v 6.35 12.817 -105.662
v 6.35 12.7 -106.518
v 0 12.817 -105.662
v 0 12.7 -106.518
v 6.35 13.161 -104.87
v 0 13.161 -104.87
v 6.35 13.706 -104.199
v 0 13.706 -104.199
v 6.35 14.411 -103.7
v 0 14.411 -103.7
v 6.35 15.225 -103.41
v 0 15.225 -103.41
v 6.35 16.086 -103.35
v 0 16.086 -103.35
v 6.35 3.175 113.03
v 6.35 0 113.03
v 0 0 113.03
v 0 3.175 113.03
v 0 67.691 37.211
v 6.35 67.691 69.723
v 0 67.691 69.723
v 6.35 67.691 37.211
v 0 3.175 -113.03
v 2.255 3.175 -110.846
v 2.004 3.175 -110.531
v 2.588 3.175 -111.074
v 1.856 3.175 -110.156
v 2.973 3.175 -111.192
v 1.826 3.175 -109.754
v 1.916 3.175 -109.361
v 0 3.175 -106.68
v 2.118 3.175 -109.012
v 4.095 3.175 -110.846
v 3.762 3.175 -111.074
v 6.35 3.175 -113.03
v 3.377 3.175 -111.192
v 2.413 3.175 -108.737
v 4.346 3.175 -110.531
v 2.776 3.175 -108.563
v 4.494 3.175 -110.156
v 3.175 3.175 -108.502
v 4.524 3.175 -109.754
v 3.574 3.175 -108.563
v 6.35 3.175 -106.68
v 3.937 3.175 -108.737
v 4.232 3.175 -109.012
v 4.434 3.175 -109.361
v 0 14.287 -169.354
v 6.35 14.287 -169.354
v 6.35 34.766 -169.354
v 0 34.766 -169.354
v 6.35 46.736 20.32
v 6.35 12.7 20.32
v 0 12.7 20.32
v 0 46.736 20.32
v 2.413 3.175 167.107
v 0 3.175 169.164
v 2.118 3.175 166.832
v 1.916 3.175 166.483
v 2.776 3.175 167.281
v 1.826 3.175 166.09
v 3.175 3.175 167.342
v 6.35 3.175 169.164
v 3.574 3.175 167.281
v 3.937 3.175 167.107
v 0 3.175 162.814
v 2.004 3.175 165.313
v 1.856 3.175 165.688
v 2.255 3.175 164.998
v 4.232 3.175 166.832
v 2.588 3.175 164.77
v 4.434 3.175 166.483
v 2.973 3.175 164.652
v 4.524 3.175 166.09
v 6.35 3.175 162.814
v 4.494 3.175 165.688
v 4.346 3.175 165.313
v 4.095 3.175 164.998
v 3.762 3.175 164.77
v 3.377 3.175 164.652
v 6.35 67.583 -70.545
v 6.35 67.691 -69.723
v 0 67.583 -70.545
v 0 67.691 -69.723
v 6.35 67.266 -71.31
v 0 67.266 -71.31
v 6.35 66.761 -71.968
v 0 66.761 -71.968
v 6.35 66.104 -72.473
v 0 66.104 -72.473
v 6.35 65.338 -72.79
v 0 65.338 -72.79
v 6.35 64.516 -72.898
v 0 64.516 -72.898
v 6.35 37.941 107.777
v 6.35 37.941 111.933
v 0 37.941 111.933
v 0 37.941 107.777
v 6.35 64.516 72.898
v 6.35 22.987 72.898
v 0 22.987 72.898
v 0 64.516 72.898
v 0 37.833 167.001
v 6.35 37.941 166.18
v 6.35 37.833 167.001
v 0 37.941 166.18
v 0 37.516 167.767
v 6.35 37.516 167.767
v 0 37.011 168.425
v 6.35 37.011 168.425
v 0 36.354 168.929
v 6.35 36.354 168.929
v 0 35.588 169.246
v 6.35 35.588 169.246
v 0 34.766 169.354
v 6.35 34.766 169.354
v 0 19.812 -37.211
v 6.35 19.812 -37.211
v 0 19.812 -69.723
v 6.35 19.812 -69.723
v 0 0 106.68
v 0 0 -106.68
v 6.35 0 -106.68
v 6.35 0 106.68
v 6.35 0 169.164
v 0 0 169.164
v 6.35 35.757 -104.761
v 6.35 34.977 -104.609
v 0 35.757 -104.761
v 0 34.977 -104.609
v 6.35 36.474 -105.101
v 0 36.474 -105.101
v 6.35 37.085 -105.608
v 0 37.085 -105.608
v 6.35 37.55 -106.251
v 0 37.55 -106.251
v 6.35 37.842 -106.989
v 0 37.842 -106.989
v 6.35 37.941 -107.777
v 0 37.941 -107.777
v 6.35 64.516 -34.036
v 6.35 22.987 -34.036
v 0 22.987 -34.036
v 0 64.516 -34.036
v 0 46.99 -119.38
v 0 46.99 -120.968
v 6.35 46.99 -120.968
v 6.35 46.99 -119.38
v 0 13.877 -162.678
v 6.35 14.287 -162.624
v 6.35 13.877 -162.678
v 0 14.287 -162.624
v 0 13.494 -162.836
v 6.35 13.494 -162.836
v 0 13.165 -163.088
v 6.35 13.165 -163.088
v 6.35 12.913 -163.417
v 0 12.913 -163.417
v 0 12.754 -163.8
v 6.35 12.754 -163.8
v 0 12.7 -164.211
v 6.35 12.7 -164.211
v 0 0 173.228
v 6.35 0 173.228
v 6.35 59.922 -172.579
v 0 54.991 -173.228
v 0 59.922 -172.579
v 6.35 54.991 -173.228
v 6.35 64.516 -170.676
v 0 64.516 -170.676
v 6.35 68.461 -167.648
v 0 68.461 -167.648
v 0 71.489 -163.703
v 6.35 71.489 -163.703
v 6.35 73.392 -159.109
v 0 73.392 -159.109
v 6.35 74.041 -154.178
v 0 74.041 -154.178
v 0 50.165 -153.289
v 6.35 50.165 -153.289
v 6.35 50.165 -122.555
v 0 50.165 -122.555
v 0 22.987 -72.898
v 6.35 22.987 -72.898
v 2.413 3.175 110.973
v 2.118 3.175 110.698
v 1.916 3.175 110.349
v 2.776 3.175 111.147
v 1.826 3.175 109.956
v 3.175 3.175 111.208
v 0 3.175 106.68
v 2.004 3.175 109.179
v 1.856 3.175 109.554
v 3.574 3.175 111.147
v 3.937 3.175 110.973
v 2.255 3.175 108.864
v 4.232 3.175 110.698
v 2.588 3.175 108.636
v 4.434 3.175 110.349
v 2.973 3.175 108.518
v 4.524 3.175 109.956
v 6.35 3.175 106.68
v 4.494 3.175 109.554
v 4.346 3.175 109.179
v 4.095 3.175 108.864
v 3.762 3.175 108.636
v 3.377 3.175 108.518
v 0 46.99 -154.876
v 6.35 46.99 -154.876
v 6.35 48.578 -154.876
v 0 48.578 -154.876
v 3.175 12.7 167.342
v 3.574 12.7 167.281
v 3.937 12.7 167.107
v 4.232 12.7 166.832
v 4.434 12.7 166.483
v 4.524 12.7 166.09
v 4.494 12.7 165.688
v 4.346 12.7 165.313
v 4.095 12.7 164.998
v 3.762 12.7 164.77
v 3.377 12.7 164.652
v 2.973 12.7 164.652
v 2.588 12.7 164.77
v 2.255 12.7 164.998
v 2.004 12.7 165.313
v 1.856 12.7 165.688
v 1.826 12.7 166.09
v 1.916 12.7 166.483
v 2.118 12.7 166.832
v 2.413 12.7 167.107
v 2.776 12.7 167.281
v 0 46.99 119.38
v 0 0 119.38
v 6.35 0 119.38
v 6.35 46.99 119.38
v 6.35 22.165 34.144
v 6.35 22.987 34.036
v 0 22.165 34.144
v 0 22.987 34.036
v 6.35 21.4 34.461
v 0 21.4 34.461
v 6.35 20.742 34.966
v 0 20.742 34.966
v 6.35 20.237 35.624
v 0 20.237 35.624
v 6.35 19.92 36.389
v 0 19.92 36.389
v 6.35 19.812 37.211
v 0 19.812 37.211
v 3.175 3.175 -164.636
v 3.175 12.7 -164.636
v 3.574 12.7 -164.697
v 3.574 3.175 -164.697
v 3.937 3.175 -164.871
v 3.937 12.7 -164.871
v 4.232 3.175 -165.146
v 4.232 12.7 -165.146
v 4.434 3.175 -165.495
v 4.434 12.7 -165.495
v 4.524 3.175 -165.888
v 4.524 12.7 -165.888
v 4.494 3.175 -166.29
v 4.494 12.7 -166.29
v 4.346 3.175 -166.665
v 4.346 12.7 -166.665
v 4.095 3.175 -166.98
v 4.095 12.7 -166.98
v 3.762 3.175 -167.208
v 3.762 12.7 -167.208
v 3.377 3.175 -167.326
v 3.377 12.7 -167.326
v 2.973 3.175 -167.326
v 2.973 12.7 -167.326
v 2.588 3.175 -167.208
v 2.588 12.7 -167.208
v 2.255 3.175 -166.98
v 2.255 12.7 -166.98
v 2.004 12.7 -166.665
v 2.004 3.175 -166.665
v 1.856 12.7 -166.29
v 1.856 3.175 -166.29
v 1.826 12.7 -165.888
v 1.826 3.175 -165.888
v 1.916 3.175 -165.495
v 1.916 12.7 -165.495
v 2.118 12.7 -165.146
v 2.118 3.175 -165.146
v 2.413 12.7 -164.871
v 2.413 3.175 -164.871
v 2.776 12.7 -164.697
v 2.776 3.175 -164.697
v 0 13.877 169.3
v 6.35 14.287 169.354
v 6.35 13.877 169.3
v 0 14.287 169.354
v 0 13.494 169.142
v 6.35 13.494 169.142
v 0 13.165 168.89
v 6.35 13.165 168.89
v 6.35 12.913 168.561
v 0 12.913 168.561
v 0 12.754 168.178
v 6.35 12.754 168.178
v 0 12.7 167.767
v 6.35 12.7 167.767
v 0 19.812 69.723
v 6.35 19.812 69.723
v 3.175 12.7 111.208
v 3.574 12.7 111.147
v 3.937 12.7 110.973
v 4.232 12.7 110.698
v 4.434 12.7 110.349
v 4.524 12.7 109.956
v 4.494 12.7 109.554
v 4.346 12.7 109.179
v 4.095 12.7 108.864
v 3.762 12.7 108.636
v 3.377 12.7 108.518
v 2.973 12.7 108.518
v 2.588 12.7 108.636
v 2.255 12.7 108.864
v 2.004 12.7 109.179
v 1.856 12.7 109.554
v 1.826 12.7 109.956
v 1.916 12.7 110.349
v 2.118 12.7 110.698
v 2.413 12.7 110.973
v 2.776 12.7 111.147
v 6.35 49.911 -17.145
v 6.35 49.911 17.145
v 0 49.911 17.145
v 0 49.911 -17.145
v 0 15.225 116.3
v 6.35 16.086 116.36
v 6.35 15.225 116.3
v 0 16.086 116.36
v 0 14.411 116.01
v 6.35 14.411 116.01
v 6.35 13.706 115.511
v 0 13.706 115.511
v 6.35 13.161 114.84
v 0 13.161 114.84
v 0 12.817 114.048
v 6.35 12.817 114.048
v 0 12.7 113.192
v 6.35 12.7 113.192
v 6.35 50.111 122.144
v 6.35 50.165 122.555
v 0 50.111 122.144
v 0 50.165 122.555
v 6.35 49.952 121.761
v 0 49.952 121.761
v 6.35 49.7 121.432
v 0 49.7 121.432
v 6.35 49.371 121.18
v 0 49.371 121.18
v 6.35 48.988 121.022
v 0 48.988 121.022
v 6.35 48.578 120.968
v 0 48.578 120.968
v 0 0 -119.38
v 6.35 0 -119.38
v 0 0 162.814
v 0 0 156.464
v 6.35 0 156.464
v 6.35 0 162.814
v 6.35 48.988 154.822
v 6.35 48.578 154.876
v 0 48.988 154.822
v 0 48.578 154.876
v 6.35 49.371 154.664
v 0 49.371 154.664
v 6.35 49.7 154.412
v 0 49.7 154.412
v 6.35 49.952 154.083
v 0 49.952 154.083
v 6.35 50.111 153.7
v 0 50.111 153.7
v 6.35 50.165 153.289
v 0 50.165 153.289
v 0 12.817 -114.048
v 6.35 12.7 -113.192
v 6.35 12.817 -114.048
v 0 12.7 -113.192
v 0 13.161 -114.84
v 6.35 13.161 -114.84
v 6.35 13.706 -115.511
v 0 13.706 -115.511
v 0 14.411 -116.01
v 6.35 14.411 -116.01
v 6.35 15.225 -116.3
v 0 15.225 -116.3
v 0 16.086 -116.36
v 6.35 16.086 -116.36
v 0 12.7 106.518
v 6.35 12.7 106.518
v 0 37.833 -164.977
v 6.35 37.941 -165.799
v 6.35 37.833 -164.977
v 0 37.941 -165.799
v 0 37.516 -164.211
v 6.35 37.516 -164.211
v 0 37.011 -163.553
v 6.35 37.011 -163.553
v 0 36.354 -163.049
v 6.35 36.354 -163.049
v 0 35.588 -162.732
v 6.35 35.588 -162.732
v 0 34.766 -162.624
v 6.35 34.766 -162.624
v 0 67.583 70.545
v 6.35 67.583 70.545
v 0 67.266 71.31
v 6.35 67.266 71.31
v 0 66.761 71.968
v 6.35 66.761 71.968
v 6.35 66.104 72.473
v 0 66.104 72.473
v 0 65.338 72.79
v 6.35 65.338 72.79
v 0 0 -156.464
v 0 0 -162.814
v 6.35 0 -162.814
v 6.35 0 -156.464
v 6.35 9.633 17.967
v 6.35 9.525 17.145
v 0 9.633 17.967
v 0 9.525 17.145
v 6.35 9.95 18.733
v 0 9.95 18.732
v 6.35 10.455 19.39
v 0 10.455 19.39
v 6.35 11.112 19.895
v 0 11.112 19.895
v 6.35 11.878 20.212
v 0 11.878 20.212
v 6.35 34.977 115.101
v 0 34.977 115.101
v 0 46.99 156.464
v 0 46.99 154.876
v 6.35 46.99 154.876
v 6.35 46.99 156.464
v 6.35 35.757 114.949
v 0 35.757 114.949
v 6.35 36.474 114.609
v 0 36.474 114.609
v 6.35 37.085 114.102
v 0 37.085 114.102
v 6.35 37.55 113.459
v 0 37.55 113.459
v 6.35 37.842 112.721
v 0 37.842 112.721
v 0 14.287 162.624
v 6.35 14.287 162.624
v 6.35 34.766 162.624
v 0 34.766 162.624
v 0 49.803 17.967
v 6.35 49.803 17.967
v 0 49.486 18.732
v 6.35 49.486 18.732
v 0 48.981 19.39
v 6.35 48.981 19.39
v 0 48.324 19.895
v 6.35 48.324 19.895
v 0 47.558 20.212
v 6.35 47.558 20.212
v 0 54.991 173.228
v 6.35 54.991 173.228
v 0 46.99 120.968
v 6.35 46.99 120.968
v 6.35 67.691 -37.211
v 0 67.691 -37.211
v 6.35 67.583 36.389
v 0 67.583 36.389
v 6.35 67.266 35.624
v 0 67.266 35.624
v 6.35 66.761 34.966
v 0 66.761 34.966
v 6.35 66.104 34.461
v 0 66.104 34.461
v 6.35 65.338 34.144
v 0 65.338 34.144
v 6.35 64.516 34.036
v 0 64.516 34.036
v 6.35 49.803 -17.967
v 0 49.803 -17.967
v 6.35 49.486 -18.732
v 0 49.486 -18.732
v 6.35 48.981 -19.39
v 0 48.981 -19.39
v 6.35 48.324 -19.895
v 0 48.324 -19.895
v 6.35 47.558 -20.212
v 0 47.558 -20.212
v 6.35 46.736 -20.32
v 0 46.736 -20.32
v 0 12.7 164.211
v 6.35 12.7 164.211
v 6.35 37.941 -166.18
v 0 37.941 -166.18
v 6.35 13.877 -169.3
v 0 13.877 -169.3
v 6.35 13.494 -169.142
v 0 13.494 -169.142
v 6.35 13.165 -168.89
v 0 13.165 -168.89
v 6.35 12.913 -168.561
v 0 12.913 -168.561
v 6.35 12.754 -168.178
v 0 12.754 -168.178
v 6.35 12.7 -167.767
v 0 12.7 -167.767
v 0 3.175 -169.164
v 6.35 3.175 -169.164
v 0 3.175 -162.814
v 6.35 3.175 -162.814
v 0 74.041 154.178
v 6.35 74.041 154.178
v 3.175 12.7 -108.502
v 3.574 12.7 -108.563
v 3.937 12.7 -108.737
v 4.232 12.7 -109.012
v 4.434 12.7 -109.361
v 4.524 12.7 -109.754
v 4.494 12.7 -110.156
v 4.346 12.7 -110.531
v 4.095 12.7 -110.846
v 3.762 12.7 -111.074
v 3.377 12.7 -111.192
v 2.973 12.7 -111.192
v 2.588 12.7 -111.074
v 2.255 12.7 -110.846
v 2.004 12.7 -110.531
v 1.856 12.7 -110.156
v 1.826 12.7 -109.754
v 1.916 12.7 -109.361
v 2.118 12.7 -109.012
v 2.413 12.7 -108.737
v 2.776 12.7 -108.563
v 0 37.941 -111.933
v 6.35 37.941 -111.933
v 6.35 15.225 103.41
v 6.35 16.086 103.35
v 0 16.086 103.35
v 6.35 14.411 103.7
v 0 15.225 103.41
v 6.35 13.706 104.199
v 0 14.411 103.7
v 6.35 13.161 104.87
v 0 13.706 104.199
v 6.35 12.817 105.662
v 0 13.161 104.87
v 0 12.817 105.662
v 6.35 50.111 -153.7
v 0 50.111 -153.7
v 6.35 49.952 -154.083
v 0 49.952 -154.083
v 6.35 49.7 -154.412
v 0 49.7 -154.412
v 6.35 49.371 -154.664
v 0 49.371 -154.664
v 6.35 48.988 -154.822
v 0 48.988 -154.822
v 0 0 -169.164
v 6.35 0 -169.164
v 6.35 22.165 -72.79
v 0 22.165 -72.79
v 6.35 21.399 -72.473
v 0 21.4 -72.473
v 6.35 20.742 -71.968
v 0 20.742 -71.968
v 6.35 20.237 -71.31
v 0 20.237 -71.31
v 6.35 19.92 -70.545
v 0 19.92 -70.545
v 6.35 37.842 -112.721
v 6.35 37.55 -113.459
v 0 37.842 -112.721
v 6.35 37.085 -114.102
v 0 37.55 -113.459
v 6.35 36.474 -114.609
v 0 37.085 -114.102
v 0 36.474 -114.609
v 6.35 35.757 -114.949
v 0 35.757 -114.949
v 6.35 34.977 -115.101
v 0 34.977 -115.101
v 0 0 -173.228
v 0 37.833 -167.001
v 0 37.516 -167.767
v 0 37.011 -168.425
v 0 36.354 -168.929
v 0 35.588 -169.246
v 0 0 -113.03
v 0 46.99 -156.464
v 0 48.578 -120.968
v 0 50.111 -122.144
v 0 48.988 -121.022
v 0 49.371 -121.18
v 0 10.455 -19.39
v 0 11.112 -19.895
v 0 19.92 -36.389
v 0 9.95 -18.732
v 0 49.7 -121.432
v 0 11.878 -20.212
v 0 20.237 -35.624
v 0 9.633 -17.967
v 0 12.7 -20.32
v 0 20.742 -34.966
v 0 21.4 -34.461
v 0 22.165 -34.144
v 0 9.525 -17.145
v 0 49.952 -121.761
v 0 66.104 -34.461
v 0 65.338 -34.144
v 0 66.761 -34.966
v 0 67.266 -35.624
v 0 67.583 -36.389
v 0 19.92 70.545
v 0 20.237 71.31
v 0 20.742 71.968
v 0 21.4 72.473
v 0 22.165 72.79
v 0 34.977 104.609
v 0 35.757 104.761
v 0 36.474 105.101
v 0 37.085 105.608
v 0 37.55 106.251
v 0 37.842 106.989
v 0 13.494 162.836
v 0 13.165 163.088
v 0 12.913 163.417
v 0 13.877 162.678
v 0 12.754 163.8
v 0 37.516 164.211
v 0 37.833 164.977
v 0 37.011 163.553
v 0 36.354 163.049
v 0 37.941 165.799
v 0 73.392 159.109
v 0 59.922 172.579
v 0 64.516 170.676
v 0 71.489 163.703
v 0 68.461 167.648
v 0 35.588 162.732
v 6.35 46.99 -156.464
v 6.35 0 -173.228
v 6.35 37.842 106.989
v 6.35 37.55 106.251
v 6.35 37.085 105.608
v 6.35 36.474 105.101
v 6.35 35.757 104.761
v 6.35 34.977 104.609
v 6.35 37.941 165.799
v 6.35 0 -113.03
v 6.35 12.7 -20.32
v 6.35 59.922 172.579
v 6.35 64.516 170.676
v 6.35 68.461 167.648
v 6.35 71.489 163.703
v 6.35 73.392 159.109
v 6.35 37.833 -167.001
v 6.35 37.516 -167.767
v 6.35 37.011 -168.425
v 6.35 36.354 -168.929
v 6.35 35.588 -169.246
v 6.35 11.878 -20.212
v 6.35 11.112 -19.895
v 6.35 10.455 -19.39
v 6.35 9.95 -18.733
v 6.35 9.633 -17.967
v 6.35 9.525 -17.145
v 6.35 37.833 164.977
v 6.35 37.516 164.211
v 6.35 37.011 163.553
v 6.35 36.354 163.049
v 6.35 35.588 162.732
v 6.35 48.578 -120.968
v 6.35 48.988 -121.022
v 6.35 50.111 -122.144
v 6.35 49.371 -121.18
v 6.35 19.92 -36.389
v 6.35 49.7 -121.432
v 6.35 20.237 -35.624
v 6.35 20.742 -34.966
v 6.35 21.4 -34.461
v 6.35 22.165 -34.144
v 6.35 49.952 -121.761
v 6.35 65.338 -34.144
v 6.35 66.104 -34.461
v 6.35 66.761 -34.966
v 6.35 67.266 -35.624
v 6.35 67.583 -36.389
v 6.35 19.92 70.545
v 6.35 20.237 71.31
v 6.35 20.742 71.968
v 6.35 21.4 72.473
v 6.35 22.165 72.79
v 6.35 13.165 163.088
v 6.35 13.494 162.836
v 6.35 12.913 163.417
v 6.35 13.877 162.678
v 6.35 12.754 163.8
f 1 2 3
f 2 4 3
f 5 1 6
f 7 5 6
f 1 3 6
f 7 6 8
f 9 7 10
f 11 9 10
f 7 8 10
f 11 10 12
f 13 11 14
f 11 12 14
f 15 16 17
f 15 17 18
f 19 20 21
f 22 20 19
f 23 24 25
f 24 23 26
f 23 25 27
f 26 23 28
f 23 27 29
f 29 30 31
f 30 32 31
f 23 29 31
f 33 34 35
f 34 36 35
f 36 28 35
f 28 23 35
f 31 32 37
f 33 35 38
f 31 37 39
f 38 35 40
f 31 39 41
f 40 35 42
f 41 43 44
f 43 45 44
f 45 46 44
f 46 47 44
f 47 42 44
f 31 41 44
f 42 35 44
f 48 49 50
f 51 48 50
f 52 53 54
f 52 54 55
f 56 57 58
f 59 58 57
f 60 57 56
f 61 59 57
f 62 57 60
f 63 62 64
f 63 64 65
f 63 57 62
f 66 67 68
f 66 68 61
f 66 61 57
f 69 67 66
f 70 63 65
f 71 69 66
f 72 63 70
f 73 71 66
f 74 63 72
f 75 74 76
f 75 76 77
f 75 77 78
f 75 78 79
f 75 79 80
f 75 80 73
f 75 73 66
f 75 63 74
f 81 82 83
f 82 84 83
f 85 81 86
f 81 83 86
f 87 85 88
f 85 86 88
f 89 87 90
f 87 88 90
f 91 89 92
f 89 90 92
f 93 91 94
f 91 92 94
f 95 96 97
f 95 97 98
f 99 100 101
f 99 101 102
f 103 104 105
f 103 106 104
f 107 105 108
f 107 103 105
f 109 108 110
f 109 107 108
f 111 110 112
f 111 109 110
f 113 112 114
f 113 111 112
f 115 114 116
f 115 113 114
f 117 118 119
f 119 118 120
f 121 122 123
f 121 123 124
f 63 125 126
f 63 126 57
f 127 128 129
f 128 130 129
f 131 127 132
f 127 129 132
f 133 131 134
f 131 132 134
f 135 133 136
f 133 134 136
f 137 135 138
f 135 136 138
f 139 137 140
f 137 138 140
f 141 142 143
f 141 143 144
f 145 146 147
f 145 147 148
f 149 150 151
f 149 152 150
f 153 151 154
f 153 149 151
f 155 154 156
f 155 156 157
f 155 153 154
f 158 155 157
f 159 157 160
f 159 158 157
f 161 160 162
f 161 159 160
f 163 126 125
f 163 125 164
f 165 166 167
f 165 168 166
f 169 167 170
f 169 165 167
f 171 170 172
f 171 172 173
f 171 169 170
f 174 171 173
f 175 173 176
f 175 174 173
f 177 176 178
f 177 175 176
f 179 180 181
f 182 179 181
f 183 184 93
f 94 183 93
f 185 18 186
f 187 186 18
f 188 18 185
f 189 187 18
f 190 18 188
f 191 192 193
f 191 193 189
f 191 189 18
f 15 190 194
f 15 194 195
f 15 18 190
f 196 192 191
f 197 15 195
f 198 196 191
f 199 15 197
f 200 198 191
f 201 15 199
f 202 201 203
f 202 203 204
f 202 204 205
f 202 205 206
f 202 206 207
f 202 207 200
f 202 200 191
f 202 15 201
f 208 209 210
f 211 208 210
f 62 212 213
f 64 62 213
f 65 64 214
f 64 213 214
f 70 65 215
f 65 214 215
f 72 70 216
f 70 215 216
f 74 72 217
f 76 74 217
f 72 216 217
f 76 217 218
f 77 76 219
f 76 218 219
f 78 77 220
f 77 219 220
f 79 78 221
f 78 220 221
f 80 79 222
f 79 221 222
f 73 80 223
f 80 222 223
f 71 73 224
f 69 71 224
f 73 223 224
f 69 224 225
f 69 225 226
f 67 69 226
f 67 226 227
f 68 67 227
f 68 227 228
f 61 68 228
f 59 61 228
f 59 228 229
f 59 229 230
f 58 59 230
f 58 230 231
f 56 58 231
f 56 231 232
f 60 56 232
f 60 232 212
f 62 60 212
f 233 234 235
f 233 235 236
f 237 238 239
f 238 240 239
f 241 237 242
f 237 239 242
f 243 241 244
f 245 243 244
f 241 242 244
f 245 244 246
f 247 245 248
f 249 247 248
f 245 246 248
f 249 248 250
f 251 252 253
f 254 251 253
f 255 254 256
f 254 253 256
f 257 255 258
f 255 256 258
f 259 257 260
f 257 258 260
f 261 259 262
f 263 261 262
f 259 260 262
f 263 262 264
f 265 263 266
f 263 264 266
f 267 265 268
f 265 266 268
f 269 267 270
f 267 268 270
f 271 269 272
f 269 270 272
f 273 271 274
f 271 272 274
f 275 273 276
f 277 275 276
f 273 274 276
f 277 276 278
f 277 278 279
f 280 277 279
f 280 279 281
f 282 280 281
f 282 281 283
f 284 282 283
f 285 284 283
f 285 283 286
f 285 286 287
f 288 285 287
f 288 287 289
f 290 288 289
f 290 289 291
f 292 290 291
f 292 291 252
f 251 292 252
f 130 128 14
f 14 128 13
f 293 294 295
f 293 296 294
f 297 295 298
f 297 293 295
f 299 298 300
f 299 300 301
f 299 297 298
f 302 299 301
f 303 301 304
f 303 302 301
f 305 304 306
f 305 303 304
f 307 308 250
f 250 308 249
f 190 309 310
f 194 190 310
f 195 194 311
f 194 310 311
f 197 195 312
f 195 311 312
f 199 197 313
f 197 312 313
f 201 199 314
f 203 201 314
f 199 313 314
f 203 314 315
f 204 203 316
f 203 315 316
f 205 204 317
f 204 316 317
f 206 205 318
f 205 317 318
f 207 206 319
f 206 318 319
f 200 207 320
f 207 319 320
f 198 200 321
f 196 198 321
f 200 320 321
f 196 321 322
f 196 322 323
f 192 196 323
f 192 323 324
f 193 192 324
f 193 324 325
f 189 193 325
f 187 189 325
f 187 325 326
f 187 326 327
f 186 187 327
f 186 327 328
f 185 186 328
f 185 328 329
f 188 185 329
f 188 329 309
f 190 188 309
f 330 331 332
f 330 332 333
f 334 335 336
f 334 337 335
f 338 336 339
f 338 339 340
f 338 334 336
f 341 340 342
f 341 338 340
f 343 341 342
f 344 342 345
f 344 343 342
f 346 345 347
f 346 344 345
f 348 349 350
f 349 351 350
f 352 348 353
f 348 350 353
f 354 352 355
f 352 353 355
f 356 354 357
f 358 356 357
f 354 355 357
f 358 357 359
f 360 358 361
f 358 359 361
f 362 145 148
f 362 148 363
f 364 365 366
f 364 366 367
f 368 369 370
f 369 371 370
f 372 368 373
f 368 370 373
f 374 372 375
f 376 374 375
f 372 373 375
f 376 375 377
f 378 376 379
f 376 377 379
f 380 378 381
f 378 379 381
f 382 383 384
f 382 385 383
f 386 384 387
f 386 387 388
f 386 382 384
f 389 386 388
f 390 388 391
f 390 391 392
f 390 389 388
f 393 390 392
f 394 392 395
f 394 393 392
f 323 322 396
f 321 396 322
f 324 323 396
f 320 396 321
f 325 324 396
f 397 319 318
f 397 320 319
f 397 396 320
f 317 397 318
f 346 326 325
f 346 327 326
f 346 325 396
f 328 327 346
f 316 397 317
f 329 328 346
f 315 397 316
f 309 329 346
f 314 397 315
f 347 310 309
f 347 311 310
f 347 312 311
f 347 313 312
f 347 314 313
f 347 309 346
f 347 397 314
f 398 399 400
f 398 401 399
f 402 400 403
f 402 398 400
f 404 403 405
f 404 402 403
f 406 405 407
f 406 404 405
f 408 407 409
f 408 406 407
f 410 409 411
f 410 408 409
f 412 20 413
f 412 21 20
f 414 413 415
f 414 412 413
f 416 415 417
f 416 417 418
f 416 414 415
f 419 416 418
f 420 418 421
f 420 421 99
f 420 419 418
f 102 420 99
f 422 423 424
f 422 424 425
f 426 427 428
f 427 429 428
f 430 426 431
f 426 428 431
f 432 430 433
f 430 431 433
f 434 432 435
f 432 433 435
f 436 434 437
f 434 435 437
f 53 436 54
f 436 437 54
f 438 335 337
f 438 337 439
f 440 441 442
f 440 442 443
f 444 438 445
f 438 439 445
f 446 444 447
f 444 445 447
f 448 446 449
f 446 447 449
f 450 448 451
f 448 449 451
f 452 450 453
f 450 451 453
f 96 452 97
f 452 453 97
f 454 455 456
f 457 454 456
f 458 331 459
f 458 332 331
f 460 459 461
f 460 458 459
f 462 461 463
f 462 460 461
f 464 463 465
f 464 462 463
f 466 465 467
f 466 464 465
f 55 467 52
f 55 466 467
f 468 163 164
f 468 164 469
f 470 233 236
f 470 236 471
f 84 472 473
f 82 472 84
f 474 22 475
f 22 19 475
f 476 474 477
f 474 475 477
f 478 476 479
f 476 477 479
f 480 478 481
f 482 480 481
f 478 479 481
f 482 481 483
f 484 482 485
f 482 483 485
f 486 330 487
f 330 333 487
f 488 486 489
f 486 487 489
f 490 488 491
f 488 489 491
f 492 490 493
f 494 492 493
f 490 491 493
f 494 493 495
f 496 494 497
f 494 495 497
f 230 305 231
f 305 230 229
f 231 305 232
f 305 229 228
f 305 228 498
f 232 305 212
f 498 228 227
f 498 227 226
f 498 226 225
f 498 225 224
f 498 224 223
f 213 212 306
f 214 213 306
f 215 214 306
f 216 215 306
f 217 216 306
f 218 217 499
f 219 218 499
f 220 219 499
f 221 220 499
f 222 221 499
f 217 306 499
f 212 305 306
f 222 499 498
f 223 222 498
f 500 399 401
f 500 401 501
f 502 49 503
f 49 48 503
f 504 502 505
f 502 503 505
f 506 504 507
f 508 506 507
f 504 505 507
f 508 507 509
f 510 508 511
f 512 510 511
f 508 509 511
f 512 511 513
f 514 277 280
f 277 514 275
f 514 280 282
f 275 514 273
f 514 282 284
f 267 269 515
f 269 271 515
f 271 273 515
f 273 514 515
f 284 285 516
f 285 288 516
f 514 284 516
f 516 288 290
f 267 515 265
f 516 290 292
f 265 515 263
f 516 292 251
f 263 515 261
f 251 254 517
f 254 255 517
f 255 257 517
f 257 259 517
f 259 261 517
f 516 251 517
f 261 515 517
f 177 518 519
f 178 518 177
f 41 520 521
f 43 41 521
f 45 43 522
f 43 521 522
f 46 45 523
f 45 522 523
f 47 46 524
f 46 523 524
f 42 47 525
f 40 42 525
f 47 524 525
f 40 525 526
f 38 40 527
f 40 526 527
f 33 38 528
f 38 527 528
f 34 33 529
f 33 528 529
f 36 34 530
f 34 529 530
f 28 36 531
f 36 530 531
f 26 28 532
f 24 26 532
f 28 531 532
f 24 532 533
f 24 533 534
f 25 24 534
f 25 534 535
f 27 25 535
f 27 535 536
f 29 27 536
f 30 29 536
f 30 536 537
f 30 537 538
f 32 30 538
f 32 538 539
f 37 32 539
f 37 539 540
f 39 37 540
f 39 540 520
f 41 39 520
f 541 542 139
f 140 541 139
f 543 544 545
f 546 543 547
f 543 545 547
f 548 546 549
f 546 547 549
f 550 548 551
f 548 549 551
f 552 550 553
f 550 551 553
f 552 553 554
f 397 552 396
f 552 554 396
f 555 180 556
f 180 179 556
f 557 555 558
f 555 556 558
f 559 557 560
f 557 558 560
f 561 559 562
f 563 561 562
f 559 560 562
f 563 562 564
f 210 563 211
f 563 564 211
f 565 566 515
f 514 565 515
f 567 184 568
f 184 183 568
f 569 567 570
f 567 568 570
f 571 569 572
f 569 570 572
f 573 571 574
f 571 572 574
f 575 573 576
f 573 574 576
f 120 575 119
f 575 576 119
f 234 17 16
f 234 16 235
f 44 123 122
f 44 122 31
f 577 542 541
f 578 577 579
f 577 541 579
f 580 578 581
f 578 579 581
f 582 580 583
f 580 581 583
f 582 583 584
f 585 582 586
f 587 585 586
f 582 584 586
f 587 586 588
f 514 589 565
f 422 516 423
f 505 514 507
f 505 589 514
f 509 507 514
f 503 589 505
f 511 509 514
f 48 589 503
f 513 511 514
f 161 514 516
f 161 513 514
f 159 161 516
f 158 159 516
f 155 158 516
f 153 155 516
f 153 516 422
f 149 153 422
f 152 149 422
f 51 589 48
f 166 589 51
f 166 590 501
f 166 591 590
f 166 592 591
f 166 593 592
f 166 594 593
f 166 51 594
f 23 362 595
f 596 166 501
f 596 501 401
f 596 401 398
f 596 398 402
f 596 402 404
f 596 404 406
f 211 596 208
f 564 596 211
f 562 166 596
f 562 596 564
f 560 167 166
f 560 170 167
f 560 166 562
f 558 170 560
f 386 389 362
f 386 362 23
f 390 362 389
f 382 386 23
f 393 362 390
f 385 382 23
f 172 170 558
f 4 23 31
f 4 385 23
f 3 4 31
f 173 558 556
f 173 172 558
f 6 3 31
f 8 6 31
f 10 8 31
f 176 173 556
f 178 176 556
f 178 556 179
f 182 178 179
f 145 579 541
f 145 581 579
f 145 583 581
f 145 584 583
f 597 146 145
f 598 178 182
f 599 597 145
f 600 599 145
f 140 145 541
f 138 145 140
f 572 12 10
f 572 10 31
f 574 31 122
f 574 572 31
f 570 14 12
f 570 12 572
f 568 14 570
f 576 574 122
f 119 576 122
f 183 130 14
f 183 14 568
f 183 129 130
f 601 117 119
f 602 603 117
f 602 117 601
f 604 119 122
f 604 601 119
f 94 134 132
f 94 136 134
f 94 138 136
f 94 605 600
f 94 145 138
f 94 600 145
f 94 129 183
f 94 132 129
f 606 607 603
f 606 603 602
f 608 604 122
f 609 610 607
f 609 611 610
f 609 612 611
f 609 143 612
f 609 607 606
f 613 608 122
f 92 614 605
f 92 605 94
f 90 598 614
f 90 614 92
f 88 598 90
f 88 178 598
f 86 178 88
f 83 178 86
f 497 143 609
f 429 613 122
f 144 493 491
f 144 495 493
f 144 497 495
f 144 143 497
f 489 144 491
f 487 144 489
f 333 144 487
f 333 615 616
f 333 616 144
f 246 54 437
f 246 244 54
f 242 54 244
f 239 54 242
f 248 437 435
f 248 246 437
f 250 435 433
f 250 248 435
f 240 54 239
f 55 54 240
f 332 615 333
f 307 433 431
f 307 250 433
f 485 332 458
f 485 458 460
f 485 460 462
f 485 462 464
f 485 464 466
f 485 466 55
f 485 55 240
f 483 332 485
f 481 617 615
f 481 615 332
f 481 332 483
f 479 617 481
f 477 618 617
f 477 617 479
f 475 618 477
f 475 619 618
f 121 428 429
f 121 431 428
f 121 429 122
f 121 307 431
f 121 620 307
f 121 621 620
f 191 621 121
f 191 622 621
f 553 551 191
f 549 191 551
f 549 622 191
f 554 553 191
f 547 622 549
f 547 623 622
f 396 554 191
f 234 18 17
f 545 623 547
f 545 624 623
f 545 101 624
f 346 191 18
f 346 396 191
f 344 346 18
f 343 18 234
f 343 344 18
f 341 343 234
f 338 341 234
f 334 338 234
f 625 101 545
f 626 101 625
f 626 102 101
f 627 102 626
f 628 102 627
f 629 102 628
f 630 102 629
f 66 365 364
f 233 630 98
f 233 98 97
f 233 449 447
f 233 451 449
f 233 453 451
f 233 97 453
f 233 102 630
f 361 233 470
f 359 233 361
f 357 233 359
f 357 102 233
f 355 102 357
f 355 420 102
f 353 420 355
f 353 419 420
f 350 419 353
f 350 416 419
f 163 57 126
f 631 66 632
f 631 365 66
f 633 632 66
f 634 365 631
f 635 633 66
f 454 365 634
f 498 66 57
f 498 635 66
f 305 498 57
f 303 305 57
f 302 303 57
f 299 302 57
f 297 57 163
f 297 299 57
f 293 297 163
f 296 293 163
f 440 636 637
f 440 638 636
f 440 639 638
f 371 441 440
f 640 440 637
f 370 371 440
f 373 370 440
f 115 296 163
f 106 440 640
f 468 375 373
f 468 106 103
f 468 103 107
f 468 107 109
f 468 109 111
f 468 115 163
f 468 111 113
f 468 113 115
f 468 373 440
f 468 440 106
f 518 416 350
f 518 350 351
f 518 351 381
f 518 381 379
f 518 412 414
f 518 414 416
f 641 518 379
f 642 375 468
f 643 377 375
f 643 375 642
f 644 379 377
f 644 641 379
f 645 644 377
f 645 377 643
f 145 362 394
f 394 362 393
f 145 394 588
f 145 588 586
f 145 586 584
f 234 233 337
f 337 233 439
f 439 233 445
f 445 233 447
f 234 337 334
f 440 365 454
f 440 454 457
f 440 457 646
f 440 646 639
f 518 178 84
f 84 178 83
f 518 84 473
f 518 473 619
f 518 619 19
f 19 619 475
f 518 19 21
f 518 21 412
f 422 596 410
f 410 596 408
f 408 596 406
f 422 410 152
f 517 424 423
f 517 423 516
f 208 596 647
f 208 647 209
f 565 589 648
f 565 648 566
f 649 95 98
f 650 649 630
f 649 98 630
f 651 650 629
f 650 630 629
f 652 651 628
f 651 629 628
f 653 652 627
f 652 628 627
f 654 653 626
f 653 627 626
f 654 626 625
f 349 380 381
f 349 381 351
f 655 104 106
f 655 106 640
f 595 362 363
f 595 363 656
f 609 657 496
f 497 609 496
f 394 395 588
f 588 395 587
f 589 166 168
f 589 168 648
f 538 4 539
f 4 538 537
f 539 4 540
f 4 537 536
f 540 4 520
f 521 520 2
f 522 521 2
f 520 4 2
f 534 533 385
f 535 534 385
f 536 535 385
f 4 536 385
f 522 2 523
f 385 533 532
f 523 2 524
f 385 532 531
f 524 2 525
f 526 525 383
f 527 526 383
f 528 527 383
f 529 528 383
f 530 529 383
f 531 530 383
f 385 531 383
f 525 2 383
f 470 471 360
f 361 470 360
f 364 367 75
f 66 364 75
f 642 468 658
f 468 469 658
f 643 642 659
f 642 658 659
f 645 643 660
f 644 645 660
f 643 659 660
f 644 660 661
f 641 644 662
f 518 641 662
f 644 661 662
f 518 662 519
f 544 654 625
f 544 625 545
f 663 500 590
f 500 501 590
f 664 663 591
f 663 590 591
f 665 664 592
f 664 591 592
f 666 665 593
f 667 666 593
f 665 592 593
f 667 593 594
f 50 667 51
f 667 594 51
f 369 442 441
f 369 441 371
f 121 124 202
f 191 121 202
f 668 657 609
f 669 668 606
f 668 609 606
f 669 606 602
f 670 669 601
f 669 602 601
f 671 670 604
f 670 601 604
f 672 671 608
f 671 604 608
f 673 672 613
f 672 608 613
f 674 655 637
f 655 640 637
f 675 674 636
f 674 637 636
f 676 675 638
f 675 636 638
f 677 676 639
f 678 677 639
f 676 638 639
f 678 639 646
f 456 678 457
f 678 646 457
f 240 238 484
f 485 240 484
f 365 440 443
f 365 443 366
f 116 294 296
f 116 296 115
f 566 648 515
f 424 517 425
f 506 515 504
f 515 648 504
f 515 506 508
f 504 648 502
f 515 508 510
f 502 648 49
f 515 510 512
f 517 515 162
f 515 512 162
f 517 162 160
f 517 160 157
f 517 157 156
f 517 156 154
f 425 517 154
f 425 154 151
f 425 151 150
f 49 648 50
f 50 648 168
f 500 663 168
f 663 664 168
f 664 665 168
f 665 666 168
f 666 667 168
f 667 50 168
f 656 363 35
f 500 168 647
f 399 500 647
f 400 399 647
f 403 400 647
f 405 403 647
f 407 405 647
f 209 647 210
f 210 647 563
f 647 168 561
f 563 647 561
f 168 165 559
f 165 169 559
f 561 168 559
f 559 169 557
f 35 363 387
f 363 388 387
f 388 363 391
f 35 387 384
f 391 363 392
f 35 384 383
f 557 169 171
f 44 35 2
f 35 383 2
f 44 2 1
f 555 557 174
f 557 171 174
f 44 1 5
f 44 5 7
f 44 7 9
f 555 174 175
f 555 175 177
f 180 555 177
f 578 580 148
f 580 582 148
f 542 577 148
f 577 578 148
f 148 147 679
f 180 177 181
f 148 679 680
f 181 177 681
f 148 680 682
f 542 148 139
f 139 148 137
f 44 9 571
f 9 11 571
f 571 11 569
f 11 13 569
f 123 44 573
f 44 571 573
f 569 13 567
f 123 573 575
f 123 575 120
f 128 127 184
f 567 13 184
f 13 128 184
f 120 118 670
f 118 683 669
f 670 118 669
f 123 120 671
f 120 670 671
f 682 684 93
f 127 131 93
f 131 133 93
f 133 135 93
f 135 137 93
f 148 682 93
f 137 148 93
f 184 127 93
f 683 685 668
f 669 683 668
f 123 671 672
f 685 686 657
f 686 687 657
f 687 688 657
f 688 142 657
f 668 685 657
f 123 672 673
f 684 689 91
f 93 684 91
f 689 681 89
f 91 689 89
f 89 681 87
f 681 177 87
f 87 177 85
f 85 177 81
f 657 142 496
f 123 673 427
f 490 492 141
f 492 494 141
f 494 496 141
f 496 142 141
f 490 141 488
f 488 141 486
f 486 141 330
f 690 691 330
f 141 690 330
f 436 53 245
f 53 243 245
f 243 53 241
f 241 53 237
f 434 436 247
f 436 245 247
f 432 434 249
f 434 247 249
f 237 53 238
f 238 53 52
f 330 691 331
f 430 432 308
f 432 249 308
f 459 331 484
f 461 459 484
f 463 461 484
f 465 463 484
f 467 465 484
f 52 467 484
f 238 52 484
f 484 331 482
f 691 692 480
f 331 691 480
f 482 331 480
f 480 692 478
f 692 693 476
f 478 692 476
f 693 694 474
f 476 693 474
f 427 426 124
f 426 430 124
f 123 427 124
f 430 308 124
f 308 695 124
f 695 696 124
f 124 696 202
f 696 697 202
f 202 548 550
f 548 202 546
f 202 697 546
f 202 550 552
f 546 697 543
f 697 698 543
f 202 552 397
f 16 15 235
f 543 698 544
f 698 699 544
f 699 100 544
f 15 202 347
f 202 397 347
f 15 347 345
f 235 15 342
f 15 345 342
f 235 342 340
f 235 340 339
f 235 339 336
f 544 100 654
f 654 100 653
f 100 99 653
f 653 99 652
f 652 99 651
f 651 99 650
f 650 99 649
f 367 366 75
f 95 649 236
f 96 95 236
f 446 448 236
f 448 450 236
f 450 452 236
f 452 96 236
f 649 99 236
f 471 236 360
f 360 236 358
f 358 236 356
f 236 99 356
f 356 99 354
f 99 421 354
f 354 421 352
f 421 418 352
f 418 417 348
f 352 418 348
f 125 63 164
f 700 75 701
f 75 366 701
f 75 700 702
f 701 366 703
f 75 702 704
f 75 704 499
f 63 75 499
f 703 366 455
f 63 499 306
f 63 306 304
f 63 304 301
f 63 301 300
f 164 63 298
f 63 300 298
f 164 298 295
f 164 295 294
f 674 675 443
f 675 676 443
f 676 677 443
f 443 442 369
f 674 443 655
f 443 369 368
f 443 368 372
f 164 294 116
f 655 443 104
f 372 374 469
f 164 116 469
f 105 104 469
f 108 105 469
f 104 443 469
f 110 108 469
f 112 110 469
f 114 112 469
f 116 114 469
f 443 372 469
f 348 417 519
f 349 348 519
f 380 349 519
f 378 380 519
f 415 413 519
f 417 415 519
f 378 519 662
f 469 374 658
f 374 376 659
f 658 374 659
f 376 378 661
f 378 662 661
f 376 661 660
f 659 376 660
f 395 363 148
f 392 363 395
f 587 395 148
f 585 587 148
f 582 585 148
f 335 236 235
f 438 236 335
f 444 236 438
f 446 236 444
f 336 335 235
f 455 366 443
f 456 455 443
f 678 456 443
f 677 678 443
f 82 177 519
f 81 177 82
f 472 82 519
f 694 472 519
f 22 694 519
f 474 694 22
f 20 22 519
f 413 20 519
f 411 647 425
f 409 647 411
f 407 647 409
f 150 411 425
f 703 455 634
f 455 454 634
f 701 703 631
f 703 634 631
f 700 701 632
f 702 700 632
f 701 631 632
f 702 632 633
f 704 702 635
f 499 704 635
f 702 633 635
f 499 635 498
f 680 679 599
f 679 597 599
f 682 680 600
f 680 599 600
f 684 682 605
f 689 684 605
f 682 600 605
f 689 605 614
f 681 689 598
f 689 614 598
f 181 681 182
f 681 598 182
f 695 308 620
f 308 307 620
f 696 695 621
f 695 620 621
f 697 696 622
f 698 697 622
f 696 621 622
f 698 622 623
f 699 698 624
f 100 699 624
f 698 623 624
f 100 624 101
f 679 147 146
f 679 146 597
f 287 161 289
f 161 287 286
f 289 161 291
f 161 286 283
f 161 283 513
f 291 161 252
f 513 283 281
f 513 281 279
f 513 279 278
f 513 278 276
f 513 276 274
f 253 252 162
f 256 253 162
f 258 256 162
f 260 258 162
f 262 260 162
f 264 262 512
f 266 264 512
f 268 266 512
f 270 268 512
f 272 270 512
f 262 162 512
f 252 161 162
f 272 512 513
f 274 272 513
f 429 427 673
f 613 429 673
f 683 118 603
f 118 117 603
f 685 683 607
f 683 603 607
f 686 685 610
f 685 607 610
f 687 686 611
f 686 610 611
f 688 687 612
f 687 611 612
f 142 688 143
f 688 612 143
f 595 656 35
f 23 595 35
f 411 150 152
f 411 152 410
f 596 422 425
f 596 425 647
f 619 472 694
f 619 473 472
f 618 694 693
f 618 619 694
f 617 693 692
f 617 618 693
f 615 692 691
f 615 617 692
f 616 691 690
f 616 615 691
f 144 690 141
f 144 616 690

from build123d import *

# Parameters (mm, degrees)
BOSS_EXTRUDE1_DEPTH       = 6.35
FILLET1_R                 = 19.05
SKETCH2_W                 = 33.909
SKETCH2_H                 = 3.175
CUT_EXTRUDE1_DEPTH        = 189.494912836
FILLET2_R                 = 1.5875
FILLET2_OF_MIRROR1_R      = 1.5875
SKETCH3_W                 = 6.35
SKETCH3_H                 = 3.175
CUT_EXTRUDE2_DEPTH        = 189.494912836
SKETCH4_W                 = 38.862
SKETCH4_H                 = 47.879
SKETCH4_W_2               = 40.64
SKETCH4_H_2               = 40.386
CUT_EXTRUDE3_DEPTH        = 189.494912836
FILLET3_R                 = 3.175
SKETCH5_W                 = 6.731
SKETCH5_H                 = 25.24125
CUT_EXTRUDE4_DEPTH        = 189.494912836
FILLET4_R                 = 3.175
FILLET5_R                 = 1.5875
F_6_32_TAPPED_HOLE1_D     = 2.7051
F_6_32_TAPPED_HOLE1_DEPTH = 13.335
F_6_32_TAPPED_HOLE1_TIP   = 0.81269403


with BuildPart() as part:
    # Sketch1 → Boss-Extrude1 (new body)
    with BuildSketch(Plane(origin=(0, 0, 0), x_dir=(0, 0, -1), z_dir=(1, 0, 0))):
        Polygon((173.228, 74.041), (173.228, 0), (156.464, 0), (156.464, 46.99), (119.38, 46.99), (119.38, 0), (-119.38, 0), (-119.38, 46.99), (-156.464, 46.99), (-156.464, 0), (-173.228, 0), (-173.228, 74.041), align=None)
    extrude(amount=BOSS_EXTRUDE1_DEPTH)

    # Fillet1
    fillet1_edges = [part.edges().sort_by_distance(p)[0] for p in [
        (3.175, 74.041, 173.228),
        (3.175, 74.041, -173.228),
    ]]
    fillet(fillet1_edges, radius=FILLET1_R)

    # Sketch2 → Cut-Extrude1 (cut, through all)
    with BuildSketch(Plane(origin=(6.35, 0, 0), x_dir=(0, 0, -1), z_dir=(1, 0, 0))):
        with Locations((-137.922, 48.5775)):
            Rectangle(SKETCH2_W, SKETCH2_H)
    cut_extrude1 = extrude(amount=-CUT_EXTRUDE1_DEPTH, mode=Mode.SUBTRACT)

    # Fillet2
    fillet2_edges = [part.edges().sort_by_distance(p)[0] for p in [
        (3.175, 50.165, 154.8765),
        (3.175, 50.165, 120.9675),
    ]]
    fillet(fillet2_edges, radius=FILLET2_R)

    # Mirror1: Cut-Extrude1 across plane
    add(cut_extrude1.mirror(Plane.XY), mode=Mode.SUBTRACT)

    # Fillet2 of Mirror1
    fillet2_of_mirror1_edges = [part.edges().sort_by_distance(p)[0] for p in [
        (3.175, 50.165, -154.8765),
        (3.175, 50.165, -120.9675),
    ]]
    fillet(fillet2_of_mirror1_edges, radius=FILLET2_OF_MIRROR1_R)

    # Sketch3 → Cut-Extrude2 (cut, through all)
    with BuildSketch(Plane(origin=(6.35, 0, 0), x_dir=(0, 0, -1), z_dir=(1, 0, 0))):
        with Locations((-109.855, 1.5875)):
            Rectangle(SKETCH3_W, SKETCH3_H)
        with Locations((-165.989, 1.5875)):
            Rectangle(SKETCH3_W, SKETCH3_H)
    cut_extrude2 = extrude(amount=-CUT_EXTRUDE2_DEPTH, mode=Mode.SUBTRACT)

    # Mirror2: Cut-Extrude2 across plane
    add(cut_extrude2.mirror(Plane.XY), mode=Mode.SUBTRACT)

    # Sketch4 → Cut-Extrude3 (cut, through all)
    with BuildSketch(Plane(origin=(6.35, 0, 0), x_dir=(0, 0, -1), z_dir=(1, 0, 0))):
        with Locations((53.467, 43.7515)):
            Rectangle(SKETCH4_W, SKETCH4_H)
        with Locations((-53.467, 43.7515)):
            Rectangle(SKETCH4_W, SKETCH4_H)
        with Locations((0, 29.718)):
            Rectangle(SKETCH4_W_2, SKETCH4_H_2)
    extrude(amount=-CUT_EXTRUDE3_DEPTH, mode=Mode.SUBTRACT)

    # Fillet3
    fillet3_edges = [part.edges().sort_by_distance(p)[0] for p in [
        (3.175, 19.812, 72.898),
        (3.175, 67.691, 72.898),
        (3.175, 67.691, 34.036),
        (3.175, 19.812, 34.036),
        (3.175, 67.691, -34.036),
        (3.175, 67.691, -72.898),
        (3.175, 19.812, -72.898),
        (3.175, 19.812, -34.036),
        (3.175, 9.525, 20.32),
        (3.175, 49.911, 20.32),
        (3.175, 49.911, -20.32),
        (3.175, 9.525, -20.32),
    ]]
    fillet(fillet3_edges, radius=FILLET3_R)

    # Sketch5 → Cut-Extrude4 (cut, through all)
    with BuildSketch(Plane(origin=(6.35, 0, 0), x_dir=(0, 0, -1), z_dir=(1, 0, 0))):
        with Locations((165.989, 25.320625)):
            Rectangle(SKETCH5_W, SKETCH5_H)
        with Locations((-165.989, 25.320625)):
            Rectangle(SKETCH5_W, SKETCH5_H)
        Polygon((103.124, 12.7), (116.586, 12.7), (114.90325, 37.94125), (104.80675, 37.94125), align=None)
        Polygon((-103.124, 12.7), (-116.586, 12.7), (-114.90325, 37.94125), (-104.80675, 37.94125), align=None)
    extrude(amount=-CUT_EXTRUDE4_DEPTH, mode=Mode.SUBTRACT)

    # Fillet4
    fillet4_edges = [part.edges().sort_by_distance(p)[0] for p in [
        (3.175, 37.94125, -169.3545),
        (3.175, 37.94125, -162.6235),
        (3.175, 37.94125, 169.3545),
        (3.175, 37.94125, 162.6235),
        (3.175, 12.7, -103.124),
        (3.175, 37.94125, -104.80675),
        (3.175, 37.94125, -114.90325),
        (3.175, 12.7, -116.586),
        (3.175, 37.94125, 104.80675),
        (3.175, 12.7, 103.124),
        (3.175, 12.7, 116.586),
        (3.175, 37.94125, 114.90325),
    ]]
    fillet(fillet4_edges, radius=FILLET4_R)

    # Fillet5
    fillet5_edges = [part.edges().sort_by_distance(p)[0] for p in [
        (3.175, 12.7, -169.3545),
        (3.175, 12.7, -162.6235),
        (3.175, 12.7, 169.3545),
        (3.175, 12.7, 162.6235),
    ]]
    fillet(fillet5_edges, radius=FILLET5_R)

    # #6-32 Tapped Hole1
    with Locations(Plane(origin=(3.175, 3.175, 165.989), x_dir=(0, 0, -1), z_dir=(0, -1, 0))):
        with Locations((0, 0), (56.134, 0), (275.844, 0), (331.978, 0)):
            Hole(F_6_32_TAPPED_HOLE1_D / 2, depth=F_6_32_TAPPED_HOLE1_DEPTH)
            with Locations((0, 0, -(F_6_32_TAPPED_HOLE1_DEPTH + F_6_32_TAPPED_HOLE1_TIP / 2))):  # 118° drill point
                Cone(0, F_6_32_TAPPED_HOLE1_D / 2, F_6_32_TAPPED_HOLE1_TIP, mode=Mode.SUBTRACT)


solid = part.part
